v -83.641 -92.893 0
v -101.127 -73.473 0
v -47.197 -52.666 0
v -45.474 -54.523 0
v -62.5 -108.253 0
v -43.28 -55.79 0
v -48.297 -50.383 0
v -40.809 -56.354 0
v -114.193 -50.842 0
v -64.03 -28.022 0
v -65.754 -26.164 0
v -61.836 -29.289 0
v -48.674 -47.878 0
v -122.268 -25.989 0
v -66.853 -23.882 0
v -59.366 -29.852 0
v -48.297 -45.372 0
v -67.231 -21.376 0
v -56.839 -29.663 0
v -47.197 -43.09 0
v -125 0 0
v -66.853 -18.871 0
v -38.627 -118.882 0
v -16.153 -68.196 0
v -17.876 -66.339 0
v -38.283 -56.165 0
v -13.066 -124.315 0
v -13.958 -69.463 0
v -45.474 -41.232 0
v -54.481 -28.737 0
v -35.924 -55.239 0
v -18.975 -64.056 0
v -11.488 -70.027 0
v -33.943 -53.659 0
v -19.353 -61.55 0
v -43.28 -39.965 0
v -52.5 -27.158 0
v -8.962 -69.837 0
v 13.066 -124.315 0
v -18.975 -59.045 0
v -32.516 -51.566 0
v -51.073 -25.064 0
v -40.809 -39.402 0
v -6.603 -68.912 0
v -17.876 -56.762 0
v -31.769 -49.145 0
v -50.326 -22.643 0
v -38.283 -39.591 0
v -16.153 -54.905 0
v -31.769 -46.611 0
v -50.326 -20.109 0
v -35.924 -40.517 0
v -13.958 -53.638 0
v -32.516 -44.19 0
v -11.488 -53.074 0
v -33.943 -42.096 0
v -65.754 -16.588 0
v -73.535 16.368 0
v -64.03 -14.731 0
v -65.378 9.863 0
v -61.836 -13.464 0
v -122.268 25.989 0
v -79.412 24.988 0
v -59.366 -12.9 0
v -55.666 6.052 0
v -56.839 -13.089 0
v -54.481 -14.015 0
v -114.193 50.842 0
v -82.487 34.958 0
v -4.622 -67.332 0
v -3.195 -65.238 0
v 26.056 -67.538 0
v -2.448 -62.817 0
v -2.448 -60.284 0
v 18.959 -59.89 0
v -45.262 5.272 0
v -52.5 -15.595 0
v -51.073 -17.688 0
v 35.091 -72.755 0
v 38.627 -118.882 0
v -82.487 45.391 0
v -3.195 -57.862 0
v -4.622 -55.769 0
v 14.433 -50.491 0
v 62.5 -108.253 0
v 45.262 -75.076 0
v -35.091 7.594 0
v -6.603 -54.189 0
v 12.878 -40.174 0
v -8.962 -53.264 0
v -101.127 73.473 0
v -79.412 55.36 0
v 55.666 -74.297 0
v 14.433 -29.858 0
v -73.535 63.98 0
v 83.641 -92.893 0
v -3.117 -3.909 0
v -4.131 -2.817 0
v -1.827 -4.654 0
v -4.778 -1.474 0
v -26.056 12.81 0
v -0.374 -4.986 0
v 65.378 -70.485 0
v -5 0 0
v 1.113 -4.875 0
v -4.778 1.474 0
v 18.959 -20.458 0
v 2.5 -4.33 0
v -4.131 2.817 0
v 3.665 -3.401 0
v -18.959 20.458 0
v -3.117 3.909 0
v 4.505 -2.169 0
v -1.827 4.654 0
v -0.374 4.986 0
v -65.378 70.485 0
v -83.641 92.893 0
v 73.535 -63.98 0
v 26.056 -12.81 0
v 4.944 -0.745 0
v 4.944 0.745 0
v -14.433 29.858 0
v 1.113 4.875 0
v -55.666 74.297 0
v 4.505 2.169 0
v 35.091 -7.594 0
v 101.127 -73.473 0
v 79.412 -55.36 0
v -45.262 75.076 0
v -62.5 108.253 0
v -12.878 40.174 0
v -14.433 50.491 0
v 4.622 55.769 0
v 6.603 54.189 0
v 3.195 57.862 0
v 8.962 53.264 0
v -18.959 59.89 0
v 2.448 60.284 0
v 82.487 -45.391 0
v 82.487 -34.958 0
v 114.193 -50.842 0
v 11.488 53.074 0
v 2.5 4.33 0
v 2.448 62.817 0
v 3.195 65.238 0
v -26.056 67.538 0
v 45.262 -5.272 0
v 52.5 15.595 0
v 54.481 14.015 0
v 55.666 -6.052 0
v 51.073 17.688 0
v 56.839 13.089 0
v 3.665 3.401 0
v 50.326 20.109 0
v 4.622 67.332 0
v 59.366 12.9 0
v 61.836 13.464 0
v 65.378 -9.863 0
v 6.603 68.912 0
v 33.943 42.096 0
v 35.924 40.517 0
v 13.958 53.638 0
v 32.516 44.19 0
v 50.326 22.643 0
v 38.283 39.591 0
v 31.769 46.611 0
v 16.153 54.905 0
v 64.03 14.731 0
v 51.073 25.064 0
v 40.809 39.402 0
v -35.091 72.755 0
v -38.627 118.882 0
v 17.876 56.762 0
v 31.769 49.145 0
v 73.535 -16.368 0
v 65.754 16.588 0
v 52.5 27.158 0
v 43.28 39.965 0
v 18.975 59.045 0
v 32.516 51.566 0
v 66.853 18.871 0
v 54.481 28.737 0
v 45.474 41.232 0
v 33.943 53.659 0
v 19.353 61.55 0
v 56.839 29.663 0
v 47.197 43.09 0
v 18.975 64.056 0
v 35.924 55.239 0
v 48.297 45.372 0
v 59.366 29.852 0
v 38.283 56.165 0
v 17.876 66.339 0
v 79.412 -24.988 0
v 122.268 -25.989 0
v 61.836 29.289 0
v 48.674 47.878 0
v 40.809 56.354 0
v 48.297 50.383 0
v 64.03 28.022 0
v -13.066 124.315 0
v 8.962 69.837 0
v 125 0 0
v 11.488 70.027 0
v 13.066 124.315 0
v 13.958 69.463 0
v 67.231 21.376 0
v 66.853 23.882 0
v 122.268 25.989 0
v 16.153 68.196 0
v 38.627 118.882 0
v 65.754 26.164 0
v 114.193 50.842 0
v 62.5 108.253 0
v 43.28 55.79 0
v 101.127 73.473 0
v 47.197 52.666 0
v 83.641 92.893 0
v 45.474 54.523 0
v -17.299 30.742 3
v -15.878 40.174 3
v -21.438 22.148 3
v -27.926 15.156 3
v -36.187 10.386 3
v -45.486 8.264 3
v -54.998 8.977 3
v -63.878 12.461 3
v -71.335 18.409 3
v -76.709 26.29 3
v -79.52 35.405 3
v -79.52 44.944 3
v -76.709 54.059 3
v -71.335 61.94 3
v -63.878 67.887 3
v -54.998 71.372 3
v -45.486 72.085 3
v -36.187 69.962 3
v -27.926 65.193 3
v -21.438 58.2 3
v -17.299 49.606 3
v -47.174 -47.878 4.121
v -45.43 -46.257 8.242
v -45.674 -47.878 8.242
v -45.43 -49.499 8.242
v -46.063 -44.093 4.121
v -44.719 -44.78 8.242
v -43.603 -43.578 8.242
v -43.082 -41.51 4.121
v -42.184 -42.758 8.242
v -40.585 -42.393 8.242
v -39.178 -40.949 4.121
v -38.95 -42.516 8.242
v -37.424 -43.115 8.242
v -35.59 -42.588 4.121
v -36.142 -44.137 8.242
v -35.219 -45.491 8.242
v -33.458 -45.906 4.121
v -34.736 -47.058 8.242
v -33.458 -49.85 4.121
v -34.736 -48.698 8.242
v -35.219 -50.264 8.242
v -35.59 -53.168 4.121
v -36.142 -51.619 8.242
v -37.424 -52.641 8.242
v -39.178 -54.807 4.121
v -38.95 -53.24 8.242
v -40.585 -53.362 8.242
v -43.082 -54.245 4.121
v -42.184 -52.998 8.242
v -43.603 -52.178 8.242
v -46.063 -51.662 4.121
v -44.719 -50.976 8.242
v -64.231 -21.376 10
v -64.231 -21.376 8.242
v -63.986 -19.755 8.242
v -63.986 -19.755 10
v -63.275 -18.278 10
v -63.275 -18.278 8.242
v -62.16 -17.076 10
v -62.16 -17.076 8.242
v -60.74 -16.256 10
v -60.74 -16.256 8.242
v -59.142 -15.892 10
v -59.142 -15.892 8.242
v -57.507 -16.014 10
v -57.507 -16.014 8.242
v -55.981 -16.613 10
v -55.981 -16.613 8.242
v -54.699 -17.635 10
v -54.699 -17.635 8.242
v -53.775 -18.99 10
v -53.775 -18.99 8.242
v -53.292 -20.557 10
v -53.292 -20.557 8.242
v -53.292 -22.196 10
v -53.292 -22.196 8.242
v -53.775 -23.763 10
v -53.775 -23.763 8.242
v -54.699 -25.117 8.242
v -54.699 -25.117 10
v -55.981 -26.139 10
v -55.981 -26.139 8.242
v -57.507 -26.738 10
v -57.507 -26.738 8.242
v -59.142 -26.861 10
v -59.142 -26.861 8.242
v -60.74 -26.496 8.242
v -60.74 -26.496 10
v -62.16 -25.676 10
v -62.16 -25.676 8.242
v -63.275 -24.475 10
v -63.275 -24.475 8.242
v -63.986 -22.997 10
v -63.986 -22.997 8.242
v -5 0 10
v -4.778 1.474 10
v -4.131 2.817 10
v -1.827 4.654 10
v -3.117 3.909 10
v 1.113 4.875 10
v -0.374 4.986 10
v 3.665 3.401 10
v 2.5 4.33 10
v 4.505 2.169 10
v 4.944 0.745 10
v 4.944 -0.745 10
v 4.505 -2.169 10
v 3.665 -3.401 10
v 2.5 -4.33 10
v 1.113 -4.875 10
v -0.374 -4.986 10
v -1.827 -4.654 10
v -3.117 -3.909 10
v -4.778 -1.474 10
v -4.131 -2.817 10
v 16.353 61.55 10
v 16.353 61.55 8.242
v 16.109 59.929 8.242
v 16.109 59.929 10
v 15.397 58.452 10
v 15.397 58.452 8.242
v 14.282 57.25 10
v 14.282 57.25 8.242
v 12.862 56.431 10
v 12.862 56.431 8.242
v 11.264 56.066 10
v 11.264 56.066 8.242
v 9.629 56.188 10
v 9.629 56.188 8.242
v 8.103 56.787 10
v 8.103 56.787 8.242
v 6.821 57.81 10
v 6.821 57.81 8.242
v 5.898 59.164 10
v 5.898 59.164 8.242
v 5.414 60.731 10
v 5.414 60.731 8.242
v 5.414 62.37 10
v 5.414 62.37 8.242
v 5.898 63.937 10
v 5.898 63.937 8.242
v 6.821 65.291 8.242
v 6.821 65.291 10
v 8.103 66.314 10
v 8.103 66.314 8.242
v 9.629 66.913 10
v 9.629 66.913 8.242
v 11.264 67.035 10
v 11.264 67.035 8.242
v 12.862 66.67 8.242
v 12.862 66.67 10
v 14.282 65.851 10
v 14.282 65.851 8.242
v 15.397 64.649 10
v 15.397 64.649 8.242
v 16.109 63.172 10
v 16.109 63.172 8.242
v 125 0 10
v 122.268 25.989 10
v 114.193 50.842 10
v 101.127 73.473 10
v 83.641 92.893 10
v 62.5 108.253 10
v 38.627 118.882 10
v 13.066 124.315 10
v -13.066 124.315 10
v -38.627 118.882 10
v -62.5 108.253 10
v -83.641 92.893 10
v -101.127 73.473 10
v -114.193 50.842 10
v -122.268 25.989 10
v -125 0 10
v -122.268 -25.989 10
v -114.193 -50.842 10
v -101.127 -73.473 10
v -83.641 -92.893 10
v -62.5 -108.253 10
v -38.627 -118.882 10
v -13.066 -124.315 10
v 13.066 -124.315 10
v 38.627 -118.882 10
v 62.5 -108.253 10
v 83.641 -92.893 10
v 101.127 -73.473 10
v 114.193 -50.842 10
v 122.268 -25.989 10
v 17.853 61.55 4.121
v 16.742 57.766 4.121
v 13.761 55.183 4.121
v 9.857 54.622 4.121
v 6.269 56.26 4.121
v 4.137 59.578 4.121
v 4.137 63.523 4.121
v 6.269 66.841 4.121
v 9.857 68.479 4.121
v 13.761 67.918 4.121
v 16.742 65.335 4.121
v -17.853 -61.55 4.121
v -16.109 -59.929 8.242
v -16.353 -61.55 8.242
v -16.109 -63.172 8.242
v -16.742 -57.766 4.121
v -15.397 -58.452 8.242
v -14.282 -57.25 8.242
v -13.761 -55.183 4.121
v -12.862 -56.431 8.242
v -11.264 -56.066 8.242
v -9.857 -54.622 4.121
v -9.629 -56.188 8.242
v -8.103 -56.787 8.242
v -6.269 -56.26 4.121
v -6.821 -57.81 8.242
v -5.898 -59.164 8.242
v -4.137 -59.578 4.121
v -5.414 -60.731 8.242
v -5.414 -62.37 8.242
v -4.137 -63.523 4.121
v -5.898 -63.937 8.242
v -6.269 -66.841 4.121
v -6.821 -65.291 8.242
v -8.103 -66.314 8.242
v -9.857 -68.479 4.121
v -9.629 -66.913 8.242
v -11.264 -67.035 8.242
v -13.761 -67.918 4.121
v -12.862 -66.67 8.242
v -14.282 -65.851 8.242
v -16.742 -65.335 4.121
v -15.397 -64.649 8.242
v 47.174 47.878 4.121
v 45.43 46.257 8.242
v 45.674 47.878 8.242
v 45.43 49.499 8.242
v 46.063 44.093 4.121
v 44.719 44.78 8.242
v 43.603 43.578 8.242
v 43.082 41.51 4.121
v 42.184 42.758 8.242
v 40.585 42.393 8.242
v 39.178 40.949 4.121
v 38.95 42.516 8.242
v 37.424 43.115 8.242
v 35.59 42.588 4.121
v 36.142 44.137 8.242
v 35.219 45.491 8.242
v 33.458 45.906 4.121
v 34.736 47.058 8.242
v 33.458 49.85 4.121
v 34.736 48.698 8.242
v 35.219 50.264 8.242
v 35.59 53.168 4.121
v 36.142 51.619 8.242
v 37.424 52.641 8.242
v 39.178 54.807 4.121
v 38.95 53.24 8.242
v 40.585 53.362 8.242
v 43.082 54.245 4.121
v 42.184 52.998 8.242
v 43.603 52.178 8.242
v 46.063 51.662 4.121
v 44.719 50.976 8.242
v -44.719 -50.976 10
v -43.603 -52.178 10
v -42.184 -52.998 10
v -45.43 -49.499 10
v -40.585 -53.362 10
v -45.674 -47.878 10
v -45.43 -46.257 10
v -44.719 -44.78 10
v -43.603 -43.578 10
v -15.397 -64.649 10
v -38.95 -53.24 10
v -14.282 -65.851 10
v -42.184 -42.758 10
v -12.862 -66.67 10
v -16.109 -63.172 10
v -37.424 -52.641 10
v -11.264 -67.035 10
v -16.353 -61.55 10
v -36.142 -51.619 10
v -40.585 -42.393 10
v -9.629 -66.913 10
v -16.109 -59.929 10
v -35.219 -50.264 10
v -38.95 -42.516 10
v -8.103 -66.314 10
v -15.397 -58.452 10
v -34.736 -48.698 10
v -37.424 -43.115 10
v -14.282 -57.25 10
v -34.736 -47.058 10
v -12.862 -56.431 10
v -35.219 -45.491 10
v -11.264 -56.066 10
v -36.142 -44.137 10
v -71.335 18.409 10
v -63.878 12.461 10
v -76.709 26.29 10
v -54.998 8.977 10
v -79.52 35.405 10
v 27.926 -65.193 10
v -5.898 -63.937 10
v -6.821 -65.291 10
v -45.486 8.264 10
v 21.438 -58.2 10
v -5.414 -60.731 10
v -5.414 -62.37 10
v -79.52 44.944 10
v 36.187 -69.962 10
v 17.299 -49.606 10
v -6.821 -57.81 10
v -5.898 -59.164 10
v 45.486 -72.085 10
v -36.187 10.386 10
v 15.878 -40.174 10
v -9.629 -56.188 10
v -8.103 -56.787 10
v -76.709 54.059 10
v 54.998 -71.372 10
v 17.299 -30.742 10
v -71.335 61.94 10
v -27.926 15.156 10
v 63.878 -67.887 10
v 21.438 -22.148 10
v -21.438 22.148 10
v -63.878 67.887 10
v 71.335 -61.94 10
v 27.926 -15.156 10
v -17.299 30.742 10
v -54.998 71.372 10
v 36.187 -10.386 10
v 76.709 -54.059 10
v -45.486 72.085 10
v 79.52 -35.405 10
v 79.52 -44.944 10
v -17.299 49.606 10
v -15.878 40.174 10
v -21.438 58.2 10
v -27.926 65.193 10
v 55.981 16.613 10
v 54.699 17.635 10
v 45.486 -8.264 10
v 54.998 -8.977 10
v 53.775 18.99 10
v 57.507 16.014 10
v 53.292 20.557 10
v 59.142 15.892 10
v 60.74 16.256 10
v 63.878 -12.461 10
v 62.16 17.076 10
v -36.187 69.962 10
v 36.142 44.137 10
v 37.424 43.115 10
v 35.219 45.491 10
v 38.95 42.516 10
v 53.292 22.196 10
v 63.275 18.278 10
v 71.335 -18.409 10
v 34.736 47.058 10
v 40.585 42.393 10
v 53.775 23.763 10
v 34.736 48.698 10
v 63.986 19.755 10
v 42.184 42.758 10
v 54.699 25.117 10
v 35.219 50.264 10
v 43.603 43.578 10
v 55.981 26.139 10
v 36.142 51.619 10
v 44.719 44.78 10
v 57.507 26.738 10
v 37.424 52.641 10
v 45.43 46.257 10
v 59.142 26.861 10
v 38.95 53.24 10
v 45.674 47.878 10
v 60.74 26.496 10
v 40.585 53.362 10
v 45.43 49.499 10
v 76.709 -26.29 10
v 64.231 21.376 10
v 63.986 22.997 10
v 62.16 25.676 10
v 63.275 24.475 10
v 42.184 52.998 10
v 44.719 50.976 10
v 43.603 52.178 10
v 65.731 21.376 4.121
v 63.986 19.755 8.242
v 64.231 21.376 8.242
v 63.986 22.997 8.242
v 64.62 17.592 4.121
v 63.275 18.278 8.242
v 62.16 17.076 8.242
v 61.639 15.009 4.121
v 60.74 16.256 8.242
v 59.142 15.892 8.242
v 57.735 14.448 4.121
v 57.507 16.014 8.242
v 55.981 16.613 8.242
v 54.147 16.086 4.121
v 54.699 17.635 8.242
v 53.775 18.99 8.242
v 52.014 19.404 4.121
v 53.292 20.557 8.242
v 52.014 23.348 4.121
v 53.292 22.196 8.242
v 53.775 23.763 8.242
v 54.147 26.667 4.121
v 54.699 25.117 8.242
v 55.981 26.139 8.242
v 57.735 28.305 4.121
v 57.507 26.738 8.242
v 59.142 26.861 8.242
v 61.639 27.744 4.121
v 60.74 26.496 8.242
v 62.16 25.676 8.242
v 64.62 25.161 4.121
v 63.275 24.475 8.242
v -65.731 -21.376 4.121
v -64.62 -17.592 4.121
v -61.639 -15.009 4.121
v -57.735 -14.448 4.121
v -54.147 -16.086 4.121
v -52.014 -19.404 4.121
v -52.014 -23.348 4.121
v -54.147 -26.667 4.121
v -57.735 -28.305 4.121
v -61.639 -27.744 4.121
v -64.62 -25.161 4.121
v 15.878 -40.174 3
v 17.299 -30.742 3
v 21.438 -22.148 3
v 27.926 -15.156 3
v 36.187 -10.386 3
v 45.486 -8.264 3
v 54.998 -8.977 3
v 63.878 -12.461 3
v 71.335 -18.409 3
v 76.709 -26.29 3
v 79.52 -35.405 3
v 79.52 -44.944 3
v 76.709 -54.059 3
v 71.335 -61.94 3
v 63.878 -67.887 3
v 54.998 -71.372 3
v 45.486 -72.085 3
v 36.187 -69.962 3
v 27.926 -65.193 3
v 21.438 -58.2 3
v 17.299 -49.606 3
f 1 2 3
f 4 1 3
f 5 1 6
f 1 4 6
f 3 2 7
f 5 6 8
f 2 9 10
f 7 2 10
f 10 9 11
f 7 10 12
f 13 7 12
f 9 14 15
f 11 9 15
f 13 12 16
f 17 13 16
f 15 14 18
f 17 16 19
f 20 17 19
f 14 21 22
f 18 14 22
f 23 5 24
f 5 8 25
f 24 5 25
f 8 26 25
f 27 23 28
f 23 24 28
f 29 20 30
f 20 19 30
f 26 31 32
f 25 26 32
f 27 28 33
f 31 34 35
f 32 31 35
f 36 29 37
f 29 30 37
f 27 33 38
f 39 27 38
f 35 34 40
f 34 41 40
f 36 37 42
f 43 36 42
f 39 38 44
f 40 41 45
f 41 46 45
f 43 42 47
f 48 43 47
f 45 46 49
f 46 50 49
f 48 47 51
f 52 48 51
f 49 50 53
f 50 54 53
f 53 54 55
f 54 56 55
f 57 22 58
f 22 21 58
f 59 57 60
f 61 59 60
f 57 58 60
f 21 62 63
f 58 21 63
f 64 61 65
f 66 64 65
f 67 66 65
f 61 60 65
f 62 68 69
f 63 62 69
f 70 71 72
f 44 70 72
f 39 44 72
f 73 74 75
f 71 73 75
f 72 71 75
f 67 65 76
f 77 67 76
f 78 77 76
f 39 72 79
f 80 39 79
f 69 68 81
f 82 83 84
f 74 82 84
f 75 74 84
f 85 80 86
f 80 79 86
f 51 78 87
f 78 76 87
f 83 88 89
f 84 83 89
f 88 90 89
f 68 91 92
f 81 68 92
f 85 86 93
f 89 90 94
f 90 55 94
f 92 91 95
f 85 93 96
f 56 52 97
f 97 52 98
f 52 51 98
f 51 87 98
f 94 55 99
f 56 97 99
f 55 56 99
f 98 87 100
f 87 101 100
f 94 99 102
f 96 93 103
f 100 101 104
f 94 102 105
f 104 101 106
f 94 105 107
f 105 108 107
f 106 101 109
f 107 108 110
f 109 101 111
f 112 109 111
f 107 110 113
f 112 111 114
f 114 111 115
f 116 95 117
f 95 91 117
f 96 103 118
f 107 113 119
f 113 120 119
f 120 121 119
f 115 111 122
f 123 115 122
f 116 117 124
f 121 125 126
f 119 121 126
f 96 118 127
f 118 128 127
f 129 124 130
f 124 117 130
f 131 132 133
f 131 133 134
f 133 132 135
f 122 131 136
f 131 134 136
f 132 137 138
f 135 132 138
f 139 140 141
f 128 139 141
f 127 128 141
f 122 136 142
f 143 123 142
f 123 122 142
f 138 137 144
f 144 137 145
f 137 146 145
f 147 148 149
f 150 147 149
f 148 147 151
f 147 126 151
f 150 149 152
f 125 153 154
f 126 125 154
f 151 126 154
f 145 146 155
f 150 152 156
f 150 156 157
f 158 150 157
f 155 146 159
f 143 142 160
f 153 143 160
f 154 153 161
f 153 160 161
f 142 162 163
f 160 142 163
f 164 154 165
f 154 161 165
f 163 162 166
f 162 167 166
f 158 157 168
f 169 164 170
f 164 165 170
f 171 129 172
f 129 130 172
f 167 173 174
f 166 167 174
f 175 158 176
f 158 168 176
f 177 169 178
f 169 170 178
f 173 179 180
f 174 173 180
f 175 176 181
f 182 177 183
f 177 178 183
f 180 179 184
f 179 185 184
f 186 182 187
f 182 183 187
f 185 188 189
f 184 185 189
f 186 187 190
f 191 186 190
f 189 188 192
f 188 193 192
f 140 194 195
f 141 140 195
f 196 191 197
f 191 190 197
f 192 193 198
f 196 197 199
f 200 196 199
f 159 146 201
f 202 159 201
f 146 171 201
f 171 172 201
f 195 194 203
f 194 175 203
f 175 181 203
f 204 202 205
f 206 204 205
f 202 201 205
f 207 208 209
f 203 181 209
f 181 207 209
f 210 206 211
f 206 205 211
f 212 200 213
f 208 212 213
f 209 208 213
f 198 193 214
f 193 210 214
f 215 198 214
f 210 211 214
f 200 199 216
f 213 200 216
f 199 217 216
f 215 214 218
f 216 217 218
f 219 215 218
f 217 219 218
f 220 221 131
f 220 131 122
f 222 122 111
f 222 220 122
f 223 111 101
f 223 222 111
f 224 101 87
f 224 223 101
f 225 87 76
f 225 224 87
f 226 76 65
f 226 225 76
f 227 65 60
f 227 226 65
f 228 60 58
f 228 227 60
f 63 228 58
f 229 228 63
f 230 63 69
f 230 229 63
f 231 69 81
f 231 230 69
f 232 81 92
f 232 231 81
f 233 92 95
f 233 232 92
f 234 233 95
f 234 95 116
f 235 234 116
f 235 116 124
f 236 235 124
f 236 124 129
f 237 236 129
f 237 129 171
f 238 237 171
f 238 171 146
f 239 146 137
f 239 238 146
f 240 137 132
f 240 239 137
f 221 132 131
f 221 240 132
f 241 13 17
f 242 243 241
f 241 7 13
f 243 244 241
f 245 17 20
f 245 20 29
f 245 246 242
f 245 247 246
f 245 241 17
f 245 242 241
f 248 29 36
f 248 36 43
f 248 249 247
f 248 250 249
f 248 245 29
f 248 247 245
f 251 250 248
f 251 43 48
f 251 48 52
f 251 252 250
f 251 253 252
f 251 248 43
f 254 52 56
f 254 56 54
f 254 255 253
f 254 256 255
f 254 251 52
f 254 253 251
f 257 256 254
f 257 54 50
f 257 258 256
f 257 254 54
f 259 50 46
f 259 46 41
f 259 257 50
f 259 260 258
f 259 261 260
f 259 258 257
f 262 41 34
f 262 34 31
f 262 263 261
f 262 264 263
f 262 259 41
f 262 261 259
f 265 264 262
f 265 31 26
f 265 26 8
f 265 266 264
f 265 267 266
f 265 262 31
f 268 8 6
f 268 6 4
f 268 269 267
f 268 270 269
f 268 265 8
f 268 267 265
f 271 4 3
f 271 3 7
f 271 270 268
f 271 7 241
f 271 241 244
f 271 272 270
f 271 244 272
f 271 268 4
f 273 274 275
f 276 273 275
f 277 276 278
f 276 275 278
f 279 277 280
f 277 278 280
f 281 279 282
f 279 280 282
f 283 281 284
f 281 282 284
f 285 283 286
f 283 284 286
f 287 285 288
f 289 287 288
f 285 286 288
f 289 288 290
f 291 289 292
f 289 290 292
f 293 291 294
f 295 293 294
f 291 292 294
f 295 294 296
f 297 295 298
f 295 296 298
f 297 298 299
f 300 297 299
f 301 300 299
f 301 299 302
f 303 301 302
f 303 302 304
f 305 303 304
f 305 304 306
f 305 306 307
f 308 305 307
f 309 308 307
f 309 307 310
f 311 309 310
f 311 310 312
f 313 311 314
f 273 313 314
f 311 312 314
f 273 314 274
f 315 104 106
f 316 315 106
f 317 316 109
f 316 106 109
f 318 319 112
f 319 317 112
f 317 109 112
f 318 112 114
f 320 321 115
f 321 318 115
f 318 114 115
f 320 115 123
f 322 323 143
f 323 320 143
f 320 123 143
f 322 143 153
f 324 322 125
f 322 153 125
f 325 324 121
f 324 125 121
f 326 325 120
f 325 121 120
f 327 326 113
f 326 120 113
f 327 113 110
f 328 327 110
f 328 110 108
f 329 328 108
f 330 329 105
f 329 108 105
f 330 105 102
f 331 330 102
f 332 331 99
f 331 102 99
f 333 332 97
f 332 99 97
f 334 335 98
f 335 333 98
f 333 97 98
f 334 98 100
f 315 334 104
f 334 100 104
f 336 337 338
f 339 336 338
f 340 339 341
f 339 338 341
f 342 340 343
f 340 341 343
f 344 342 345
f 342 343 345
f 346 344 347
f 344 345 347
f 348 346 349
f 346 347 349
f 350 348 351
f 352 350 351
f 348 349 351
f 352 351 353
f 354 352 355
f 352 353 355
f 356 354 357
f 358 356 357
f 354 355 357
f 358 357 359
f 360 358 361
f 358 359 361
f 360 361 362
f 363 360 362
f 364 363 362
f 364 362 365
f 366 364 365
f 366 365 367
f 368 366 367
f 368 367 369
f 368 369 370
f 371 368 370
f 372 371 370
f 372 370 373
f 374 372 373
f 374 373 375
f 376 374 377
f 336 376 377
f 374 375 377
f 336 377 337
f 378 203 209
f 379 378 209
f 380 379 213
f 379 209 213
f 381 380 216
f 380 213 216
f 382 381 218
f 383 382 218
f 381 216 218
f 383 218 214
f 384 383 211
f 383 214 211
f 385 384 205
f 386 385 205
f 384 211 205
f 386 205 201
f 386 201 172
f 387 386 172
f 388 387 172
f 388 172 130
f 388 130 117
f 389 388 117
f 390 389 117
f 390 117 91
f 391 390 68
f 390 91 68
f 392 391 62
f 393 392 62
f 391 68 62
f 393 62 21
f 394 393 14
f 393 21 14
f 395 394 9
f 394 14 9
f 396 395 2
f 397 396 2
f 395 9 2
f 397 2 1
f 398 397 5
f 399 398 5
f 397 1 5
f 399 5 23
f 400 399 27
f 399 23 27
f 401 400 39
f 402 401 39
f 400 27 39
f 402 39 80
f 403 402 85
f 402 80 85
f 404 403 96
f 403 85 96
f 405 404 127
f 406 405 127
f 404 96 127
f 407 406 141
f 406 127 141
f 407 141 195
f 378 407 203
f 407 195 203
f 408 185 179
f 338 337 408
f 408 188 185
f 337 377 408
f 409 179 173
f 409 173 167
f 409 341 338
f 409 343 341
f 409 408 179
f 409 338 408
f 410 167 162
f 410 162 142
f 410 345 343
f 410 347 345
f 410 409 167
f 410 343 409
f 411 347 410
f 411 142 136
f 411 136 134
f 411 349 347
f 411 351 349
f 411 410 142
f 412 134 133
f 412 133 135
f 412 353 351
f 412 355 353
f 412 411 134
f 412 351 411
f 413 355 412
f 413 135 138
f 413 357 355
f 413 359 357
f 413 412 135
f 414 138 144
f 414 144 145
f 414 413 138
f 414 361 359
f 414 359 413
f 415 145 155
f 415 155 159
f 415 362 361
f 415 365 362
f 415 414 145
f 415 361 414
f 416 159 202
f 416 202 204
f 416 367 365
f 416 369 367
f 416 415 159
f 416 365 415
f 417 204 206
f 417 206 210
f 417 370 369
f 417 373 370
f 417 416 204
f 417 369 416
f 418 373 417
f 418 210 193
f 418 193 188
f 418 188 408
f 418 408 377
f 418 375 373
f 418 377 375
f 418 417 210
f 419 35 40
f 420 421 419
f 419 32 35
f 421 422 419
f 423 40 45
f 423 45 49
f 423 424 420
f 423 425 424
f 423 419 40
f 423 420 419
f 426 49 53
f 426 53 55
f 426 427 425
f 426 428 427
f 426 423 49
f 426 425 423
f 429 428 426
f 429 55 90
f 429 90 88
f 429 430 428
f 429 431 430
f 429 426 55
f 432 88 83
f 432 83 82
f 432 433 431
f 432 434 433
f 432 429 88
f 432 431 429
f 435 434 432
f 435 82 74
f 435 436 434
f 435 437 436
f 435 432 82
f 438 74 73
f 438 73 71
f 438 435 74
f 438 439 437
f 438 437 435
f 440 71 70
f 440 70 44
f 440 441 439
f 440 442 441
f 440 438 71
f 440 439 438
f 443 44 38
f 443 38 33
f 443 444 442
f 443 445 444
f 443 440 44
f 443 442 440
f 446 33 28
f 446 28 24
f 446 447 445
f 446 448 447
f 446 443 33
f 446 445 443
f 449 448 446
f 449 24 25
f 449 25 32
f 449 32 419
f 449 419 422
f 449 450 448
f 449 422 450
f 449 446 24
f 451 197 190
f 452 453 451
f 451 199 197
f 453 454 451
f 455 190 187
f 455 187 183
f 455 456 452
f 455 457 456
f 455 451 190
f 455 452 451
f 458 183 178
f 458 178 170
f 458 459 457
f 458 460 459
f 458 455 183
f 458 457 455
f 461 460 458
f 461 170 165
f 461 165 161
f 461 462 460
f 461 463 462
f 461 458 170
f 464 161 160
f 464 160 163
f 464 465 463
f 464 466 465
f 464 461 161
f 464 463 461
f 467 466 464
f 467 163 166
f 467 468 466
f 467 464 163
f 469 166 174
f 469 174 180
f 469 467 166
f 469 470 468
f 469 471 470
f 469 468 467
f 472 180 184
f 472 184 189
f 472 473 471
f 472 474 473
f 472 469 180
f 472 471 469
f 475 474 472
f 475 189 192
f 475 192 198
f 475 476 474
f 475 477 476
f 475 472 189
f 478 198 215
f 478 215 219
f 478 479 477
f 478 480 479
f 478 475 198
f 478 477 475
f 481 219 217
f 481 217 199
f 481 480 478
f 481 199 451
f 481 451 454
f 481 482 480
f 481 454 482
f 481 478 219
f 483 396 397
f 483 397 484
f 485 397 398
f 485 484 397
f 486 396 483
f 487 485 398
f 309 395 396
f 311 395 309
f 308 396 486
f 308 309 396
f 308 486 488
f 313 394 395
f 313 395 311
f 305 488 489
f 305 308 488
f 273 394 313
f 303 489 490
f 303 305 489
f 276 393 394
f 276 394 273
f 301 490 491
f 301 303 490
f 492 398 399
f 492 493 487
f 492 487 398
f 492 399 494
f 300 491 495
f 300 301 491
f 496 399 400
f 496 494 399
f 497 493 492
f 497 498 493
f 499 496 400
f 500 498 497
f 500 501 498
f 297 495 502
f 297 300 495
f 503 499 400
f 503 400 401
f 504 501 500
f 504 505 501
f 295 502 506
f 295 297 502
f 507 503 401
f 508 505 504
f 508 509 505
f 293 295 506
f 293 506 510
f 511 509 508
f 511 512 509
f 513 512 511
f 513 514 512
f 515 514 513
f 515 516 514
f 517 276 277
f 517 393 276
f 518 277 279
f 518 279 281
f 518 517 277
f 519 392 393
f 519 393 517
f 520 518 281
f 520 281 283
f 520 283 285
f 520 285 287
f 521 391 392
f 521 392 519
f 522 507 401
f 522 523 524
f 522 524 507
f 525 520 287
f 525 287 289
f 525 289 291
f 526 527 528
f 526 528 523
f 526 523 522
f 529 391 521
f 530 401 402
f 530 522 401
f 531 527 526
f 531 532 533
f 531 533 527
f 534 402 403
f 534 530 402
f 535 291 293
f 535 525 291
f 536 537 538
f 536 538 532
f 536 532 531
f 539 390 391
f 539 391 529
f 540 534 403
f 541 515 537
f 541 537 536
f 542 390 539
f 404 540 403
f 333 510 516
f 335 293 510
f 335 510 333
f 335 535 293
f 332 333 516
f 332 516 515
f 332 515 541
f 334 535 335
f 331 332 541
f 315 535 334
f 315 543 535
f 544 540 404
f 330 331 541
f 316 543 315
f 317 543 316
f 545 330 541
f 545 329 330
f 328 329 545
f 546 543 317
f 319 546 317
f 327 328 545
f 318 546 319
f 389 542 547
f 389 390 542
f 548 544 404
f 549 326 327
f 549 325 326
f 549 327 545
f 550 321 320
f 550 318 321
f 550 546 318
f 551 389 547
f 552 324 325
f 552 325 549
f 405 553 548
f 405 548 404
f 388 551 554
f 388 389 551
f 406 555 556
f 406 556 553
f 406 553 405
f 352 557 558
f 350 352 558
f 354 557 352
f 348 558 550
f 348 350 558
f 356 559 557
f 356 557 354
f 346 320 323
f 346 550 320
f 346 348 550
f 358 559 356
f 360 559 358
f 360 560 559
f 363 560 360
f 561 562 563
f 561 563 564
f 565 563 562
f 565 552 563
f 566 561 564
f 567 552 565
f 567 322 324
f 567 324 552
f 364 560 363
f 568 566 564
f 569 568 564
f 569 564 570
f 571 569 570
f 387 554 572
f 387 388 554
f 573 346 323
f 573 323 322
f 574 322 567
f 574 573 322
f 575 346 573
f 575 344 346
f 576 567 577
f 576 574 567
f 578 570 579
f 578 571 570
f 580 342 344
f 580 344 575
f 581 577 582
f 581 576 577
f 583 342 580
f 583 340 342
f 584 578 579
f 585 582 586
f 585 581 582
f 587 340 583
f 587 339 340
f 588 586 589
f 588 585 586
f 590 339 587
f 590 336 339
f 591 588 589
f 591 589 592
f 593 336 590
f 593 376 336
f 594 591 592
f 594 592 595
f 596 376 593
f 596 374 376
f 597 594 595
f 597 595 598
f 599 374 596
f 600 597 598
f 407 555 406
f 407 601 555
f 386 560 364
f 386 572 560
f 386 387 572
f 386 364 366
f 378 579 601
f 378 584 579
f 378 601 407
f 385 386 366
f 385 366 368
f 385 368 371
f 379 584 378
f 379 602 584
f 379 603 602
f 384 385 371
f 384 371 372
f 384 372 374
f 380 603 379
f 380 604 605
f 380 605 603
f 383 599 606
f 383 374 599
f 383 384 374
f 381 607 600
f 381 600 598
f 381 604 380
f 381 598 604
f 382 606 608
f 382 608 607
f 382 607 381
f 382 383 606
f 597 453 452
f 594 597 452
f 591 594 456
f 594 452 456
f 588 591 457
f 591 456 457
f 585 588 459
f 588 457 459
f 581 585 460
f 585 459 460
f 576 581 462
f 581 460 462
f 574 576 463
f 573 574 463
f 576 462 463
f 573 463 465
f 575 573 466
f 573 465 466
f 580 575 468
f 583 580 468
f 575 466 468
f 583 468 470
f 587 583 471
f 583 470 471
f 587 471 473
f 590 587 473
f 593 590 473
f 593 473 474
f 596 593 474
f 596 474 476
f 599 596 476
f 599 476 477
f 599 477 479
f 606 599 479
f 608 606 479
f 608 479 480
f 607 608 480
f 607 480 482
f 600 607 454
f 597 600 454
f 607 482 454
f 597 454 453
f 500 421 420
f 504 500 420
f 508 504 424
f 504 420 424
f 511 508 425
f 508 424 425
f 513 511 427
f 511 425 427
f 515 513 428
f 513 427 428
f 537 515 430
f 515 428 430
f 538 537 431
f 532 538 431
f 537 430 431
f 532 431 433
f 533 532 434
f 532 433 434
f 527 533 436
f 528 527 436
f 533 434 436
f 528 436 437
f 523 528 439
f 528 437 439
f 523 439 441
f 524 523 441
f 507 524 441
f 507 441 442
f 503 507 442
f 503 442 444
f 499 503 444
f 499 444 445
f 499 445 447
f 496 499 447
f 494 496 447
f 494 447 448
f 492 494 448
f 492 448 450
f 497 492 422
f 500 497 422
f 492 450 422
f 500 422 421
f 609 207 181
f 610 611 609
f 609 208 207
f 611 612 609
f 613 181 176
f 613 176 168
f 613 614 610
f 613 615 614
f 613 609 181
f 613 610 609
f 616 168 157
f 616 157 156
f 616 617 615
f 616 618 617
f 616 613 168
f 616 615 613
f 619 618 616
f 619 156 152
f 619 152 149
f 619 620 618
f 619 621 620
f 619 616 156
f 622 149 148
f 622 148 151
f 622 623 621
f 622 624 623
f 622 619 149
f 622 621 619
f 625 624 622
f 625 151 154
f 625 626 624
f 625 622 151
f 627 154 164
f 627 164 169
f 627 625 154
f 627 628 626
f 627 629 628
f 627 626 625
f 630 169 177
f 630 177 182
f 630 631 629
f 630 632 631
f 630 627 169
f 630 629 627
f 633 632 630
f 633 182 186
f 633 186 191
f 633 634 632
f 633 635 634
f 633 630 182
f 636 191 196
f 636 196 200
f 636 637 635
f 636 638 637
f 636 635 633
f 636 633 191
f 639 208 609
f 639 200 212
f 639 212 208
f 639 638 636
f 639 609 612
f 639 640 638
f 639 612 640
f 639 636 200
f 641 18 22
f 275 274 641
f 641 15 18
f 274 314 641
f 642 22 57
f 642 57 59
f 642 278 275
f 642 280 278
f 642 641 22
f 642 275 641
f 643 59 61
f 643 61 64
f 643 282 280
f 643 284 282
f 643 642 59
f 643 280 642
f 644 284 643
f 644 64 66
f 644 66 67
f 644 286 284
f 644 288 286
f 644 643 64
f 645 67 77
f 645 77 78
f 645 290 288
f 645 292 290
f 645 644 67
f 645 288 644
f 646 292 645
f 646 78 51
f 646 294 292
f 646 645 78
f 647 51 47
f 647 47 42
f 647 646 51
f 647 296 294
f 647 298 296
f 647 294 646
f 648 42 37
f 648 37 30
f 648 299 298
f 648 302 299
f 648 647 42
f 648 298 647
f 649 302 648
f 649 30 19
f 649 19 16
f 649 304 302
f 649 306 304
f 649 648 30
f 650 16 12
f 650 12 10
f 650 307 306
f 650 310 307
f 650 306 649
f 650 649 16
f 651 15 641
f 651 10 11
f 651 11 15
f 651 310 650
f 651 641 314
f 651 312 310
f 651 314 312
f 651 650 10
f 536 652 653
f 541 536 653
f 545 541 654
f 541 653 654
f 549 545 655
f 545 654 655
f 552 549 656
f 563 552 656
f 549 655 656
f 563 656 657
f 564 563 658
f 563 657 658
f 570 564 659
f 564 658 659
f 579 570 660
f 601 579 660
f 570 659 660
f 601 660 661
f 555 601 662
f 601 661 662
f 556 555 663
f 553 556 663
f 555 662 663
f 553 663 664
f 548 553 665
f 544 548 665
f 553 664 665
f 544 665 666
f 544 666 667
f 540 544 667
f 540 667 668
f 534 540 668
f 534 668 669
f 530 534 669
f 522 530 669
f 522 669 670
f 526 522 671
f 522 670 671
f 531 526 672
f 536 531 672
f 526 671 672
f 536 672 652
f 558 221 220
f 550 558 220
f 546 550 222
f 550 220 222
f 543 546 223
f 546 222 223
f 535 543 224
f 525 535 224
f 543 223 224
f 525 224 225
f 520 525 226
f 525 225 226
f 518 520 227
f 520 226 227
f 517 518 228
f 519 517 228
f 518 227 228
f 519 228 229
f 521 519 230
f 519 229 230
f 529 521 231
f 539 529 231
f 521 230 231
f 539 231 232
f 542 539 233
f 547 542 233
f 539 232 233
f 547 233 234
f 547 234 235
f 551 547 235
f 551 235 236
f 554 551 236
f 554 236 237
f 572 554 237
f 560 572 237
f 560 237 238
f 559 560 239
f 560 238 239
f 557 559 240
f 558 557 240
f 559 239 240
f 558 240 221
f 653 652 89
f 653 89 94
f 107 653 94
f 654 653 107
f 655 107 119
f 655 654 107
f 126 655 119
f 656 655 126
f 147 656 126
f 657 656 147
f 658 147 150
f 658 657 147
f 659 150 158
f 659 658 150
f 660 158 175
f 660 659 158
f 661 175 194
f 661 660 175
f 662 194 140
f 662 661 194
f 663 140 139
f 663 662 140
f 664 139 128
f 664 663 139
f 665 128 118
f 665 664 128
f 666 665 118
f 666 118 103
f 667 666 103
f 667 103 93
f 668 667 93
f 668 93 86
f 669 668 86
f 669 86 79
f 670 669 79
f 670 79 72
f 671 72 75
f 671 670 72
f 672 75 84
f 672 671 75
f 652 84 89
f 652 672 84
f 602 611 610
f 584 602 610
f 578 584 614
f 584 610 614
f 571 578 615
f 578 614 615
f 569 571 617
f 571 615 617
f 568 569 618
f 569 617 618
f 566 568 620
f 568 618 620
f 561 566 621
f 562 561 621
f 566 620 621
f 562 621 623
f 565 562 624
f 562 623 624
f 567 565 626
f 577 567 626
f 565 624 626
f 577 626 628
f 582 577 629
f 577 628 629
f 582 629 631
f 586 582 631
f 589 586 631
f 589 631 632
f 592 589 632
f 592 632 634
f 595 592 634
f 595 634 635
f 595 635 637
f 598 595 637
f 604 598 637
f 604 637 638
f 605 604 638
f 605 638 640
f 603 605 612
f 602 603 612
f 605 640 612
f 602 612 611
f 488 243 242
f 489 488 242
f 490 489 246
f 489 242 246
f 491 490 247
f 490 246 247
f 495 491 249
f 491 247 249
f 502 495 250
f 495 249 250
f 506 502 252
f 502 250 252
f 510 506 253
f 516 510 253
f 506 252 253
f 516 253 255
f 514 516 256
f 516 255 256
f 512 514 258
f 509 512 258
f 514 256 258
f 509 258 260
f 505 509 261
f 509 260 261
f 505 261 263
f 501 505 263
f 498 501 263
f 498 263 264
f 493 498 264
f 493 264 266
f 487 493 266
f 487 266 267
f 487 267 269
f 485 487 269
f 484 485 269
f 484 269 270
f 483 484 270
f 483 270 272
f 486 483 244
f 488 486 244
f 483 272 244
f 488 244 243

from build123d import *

# Parameters (mm, degrees)
SKETCH1_R                     = 125
BOSS_EXTRUDE1_DEPTH           = 10
SKETCH2_R                     = 5
SKETCH2_R_2                   = 32
SKETCH2_R_3                   = 5.5
CUT_EXTRUDE1_DEPTH            = 10
CHAMFER1_SIZE                 = 3
CHAMFER2_SIZE                 = 3
CHAMFER2_SIZE2                = 8.242432258
CIRPATTERN1_COUNT             = 2
CHAMFER1_OF_CIRPATTERN1_SIZE  = 3
CHAMFER2_OF_CIRPATTERN1_SIZE2 = 8.242432258
CHAMFER2_OF_CIRPATTERN1_SIZE  = 3


with BuildPart() as part:
    # Sketch1 → Boss-Extrude1 (new body)
    with BuildSketch(Plane.XY):
        Circle(SKETCH1_R)
    extrude(amount=BOSS_EXTRUDE1_DEPTH)

    # Sketch2 → Cut-Extrude1 (cut)
    with BuildSketch(Plane(origin=(0, 0, 0), x_dir=(-1, 0, 0), z_dir=(0, 0, -1))):
        Circle(SKETCH2_R)
        with Locations((-47.877777695, -40.174225605)):
            Circle(SKETCH2_R_2)
        with Locations((10.853011104, -61.550484563)):
            Circle(SKETCH2_R_3)
        with Locations((40.174225605, -47.877777695)):
            Circle(SKETCH2_R_3)
        with Locations((58.730788799, -21.376258958)):
            Circle(SKETCH2_R_3)
    cut_extrude1 = extrude(amount=-CUT_EXTRUDE1_DEPTH, mode=Mode.SUBTRACT)

    # Chamfer1
    chamfer1_edges = [part.edges().sort_by_distance(p)[0] for p in [
        (79.877777695, -40.174225605, 0),
    ]]
    chamfer(chamfer1_edges, length=CHAMFER1_SIZE)

    # Chamfer2
    chamfer2_edges = [part.edges().sort_by_distance(p)[0] for p in [
        (-53.230788799, -21.376258958, 0),
        (-34.674225605, -47.877777695, 0),
        (-5.353011104, -61.550484563, 0),
    ]]
    chamfer2_side = [part.faces().sort_by_distance(p)[0] for p in [
        (-3.873503852, 3.722299955, 0),
    ]]
    chamfer(chamfer2_edges, length=CHAMFER2_SIZE, length2=CHAMFER2_SIZE2, reference=chamfer2_side[0])

    # CirPattern1: Cut-Extrude1 ×2 about axis
    cirpattern1_axis = Axis((0, 0, 10), (0, 0, -1))
    for i in range(1, CIRPATTERN1_COUNT):
        add(cut_extrude1.rotate(cirpattern1_axis, i * 360 / CIRPATTERN1_COUNT), mode=Mode.SUBTRACT)

    # Chamfer1 of CirPattern1
    chamfer1_of_cirpattern1_edges = [part.edges().sort_by_distance(p)[0] for p in [
        (-79.877777695, 40.174225605, 0),
    ]]
    chamfer(chamfer1_of_cirpattern1_edges, length=CHAMFER1_OF_CIRPATTERN1_SIZE)

    # Chamfer2 of CirPattern1
    chamfer2_of_cirpattern1_edges = [part.edges().sort_by_distance(p)[0] for p in [
        (53.230788799, 21.376258958, 0),
        (34.674225605, 47.877777695, 0),
        (5.353011104, 61.550484563, 0),
    ]]
    chamfer(chamfer2_of_cirpattern1_edges, length=CHAMFER2_OF_CIRPATTERN1_SIZE, length2=CHAMFER2_OF_CIRPATTERN1_SIZE2)


solid = part.part
